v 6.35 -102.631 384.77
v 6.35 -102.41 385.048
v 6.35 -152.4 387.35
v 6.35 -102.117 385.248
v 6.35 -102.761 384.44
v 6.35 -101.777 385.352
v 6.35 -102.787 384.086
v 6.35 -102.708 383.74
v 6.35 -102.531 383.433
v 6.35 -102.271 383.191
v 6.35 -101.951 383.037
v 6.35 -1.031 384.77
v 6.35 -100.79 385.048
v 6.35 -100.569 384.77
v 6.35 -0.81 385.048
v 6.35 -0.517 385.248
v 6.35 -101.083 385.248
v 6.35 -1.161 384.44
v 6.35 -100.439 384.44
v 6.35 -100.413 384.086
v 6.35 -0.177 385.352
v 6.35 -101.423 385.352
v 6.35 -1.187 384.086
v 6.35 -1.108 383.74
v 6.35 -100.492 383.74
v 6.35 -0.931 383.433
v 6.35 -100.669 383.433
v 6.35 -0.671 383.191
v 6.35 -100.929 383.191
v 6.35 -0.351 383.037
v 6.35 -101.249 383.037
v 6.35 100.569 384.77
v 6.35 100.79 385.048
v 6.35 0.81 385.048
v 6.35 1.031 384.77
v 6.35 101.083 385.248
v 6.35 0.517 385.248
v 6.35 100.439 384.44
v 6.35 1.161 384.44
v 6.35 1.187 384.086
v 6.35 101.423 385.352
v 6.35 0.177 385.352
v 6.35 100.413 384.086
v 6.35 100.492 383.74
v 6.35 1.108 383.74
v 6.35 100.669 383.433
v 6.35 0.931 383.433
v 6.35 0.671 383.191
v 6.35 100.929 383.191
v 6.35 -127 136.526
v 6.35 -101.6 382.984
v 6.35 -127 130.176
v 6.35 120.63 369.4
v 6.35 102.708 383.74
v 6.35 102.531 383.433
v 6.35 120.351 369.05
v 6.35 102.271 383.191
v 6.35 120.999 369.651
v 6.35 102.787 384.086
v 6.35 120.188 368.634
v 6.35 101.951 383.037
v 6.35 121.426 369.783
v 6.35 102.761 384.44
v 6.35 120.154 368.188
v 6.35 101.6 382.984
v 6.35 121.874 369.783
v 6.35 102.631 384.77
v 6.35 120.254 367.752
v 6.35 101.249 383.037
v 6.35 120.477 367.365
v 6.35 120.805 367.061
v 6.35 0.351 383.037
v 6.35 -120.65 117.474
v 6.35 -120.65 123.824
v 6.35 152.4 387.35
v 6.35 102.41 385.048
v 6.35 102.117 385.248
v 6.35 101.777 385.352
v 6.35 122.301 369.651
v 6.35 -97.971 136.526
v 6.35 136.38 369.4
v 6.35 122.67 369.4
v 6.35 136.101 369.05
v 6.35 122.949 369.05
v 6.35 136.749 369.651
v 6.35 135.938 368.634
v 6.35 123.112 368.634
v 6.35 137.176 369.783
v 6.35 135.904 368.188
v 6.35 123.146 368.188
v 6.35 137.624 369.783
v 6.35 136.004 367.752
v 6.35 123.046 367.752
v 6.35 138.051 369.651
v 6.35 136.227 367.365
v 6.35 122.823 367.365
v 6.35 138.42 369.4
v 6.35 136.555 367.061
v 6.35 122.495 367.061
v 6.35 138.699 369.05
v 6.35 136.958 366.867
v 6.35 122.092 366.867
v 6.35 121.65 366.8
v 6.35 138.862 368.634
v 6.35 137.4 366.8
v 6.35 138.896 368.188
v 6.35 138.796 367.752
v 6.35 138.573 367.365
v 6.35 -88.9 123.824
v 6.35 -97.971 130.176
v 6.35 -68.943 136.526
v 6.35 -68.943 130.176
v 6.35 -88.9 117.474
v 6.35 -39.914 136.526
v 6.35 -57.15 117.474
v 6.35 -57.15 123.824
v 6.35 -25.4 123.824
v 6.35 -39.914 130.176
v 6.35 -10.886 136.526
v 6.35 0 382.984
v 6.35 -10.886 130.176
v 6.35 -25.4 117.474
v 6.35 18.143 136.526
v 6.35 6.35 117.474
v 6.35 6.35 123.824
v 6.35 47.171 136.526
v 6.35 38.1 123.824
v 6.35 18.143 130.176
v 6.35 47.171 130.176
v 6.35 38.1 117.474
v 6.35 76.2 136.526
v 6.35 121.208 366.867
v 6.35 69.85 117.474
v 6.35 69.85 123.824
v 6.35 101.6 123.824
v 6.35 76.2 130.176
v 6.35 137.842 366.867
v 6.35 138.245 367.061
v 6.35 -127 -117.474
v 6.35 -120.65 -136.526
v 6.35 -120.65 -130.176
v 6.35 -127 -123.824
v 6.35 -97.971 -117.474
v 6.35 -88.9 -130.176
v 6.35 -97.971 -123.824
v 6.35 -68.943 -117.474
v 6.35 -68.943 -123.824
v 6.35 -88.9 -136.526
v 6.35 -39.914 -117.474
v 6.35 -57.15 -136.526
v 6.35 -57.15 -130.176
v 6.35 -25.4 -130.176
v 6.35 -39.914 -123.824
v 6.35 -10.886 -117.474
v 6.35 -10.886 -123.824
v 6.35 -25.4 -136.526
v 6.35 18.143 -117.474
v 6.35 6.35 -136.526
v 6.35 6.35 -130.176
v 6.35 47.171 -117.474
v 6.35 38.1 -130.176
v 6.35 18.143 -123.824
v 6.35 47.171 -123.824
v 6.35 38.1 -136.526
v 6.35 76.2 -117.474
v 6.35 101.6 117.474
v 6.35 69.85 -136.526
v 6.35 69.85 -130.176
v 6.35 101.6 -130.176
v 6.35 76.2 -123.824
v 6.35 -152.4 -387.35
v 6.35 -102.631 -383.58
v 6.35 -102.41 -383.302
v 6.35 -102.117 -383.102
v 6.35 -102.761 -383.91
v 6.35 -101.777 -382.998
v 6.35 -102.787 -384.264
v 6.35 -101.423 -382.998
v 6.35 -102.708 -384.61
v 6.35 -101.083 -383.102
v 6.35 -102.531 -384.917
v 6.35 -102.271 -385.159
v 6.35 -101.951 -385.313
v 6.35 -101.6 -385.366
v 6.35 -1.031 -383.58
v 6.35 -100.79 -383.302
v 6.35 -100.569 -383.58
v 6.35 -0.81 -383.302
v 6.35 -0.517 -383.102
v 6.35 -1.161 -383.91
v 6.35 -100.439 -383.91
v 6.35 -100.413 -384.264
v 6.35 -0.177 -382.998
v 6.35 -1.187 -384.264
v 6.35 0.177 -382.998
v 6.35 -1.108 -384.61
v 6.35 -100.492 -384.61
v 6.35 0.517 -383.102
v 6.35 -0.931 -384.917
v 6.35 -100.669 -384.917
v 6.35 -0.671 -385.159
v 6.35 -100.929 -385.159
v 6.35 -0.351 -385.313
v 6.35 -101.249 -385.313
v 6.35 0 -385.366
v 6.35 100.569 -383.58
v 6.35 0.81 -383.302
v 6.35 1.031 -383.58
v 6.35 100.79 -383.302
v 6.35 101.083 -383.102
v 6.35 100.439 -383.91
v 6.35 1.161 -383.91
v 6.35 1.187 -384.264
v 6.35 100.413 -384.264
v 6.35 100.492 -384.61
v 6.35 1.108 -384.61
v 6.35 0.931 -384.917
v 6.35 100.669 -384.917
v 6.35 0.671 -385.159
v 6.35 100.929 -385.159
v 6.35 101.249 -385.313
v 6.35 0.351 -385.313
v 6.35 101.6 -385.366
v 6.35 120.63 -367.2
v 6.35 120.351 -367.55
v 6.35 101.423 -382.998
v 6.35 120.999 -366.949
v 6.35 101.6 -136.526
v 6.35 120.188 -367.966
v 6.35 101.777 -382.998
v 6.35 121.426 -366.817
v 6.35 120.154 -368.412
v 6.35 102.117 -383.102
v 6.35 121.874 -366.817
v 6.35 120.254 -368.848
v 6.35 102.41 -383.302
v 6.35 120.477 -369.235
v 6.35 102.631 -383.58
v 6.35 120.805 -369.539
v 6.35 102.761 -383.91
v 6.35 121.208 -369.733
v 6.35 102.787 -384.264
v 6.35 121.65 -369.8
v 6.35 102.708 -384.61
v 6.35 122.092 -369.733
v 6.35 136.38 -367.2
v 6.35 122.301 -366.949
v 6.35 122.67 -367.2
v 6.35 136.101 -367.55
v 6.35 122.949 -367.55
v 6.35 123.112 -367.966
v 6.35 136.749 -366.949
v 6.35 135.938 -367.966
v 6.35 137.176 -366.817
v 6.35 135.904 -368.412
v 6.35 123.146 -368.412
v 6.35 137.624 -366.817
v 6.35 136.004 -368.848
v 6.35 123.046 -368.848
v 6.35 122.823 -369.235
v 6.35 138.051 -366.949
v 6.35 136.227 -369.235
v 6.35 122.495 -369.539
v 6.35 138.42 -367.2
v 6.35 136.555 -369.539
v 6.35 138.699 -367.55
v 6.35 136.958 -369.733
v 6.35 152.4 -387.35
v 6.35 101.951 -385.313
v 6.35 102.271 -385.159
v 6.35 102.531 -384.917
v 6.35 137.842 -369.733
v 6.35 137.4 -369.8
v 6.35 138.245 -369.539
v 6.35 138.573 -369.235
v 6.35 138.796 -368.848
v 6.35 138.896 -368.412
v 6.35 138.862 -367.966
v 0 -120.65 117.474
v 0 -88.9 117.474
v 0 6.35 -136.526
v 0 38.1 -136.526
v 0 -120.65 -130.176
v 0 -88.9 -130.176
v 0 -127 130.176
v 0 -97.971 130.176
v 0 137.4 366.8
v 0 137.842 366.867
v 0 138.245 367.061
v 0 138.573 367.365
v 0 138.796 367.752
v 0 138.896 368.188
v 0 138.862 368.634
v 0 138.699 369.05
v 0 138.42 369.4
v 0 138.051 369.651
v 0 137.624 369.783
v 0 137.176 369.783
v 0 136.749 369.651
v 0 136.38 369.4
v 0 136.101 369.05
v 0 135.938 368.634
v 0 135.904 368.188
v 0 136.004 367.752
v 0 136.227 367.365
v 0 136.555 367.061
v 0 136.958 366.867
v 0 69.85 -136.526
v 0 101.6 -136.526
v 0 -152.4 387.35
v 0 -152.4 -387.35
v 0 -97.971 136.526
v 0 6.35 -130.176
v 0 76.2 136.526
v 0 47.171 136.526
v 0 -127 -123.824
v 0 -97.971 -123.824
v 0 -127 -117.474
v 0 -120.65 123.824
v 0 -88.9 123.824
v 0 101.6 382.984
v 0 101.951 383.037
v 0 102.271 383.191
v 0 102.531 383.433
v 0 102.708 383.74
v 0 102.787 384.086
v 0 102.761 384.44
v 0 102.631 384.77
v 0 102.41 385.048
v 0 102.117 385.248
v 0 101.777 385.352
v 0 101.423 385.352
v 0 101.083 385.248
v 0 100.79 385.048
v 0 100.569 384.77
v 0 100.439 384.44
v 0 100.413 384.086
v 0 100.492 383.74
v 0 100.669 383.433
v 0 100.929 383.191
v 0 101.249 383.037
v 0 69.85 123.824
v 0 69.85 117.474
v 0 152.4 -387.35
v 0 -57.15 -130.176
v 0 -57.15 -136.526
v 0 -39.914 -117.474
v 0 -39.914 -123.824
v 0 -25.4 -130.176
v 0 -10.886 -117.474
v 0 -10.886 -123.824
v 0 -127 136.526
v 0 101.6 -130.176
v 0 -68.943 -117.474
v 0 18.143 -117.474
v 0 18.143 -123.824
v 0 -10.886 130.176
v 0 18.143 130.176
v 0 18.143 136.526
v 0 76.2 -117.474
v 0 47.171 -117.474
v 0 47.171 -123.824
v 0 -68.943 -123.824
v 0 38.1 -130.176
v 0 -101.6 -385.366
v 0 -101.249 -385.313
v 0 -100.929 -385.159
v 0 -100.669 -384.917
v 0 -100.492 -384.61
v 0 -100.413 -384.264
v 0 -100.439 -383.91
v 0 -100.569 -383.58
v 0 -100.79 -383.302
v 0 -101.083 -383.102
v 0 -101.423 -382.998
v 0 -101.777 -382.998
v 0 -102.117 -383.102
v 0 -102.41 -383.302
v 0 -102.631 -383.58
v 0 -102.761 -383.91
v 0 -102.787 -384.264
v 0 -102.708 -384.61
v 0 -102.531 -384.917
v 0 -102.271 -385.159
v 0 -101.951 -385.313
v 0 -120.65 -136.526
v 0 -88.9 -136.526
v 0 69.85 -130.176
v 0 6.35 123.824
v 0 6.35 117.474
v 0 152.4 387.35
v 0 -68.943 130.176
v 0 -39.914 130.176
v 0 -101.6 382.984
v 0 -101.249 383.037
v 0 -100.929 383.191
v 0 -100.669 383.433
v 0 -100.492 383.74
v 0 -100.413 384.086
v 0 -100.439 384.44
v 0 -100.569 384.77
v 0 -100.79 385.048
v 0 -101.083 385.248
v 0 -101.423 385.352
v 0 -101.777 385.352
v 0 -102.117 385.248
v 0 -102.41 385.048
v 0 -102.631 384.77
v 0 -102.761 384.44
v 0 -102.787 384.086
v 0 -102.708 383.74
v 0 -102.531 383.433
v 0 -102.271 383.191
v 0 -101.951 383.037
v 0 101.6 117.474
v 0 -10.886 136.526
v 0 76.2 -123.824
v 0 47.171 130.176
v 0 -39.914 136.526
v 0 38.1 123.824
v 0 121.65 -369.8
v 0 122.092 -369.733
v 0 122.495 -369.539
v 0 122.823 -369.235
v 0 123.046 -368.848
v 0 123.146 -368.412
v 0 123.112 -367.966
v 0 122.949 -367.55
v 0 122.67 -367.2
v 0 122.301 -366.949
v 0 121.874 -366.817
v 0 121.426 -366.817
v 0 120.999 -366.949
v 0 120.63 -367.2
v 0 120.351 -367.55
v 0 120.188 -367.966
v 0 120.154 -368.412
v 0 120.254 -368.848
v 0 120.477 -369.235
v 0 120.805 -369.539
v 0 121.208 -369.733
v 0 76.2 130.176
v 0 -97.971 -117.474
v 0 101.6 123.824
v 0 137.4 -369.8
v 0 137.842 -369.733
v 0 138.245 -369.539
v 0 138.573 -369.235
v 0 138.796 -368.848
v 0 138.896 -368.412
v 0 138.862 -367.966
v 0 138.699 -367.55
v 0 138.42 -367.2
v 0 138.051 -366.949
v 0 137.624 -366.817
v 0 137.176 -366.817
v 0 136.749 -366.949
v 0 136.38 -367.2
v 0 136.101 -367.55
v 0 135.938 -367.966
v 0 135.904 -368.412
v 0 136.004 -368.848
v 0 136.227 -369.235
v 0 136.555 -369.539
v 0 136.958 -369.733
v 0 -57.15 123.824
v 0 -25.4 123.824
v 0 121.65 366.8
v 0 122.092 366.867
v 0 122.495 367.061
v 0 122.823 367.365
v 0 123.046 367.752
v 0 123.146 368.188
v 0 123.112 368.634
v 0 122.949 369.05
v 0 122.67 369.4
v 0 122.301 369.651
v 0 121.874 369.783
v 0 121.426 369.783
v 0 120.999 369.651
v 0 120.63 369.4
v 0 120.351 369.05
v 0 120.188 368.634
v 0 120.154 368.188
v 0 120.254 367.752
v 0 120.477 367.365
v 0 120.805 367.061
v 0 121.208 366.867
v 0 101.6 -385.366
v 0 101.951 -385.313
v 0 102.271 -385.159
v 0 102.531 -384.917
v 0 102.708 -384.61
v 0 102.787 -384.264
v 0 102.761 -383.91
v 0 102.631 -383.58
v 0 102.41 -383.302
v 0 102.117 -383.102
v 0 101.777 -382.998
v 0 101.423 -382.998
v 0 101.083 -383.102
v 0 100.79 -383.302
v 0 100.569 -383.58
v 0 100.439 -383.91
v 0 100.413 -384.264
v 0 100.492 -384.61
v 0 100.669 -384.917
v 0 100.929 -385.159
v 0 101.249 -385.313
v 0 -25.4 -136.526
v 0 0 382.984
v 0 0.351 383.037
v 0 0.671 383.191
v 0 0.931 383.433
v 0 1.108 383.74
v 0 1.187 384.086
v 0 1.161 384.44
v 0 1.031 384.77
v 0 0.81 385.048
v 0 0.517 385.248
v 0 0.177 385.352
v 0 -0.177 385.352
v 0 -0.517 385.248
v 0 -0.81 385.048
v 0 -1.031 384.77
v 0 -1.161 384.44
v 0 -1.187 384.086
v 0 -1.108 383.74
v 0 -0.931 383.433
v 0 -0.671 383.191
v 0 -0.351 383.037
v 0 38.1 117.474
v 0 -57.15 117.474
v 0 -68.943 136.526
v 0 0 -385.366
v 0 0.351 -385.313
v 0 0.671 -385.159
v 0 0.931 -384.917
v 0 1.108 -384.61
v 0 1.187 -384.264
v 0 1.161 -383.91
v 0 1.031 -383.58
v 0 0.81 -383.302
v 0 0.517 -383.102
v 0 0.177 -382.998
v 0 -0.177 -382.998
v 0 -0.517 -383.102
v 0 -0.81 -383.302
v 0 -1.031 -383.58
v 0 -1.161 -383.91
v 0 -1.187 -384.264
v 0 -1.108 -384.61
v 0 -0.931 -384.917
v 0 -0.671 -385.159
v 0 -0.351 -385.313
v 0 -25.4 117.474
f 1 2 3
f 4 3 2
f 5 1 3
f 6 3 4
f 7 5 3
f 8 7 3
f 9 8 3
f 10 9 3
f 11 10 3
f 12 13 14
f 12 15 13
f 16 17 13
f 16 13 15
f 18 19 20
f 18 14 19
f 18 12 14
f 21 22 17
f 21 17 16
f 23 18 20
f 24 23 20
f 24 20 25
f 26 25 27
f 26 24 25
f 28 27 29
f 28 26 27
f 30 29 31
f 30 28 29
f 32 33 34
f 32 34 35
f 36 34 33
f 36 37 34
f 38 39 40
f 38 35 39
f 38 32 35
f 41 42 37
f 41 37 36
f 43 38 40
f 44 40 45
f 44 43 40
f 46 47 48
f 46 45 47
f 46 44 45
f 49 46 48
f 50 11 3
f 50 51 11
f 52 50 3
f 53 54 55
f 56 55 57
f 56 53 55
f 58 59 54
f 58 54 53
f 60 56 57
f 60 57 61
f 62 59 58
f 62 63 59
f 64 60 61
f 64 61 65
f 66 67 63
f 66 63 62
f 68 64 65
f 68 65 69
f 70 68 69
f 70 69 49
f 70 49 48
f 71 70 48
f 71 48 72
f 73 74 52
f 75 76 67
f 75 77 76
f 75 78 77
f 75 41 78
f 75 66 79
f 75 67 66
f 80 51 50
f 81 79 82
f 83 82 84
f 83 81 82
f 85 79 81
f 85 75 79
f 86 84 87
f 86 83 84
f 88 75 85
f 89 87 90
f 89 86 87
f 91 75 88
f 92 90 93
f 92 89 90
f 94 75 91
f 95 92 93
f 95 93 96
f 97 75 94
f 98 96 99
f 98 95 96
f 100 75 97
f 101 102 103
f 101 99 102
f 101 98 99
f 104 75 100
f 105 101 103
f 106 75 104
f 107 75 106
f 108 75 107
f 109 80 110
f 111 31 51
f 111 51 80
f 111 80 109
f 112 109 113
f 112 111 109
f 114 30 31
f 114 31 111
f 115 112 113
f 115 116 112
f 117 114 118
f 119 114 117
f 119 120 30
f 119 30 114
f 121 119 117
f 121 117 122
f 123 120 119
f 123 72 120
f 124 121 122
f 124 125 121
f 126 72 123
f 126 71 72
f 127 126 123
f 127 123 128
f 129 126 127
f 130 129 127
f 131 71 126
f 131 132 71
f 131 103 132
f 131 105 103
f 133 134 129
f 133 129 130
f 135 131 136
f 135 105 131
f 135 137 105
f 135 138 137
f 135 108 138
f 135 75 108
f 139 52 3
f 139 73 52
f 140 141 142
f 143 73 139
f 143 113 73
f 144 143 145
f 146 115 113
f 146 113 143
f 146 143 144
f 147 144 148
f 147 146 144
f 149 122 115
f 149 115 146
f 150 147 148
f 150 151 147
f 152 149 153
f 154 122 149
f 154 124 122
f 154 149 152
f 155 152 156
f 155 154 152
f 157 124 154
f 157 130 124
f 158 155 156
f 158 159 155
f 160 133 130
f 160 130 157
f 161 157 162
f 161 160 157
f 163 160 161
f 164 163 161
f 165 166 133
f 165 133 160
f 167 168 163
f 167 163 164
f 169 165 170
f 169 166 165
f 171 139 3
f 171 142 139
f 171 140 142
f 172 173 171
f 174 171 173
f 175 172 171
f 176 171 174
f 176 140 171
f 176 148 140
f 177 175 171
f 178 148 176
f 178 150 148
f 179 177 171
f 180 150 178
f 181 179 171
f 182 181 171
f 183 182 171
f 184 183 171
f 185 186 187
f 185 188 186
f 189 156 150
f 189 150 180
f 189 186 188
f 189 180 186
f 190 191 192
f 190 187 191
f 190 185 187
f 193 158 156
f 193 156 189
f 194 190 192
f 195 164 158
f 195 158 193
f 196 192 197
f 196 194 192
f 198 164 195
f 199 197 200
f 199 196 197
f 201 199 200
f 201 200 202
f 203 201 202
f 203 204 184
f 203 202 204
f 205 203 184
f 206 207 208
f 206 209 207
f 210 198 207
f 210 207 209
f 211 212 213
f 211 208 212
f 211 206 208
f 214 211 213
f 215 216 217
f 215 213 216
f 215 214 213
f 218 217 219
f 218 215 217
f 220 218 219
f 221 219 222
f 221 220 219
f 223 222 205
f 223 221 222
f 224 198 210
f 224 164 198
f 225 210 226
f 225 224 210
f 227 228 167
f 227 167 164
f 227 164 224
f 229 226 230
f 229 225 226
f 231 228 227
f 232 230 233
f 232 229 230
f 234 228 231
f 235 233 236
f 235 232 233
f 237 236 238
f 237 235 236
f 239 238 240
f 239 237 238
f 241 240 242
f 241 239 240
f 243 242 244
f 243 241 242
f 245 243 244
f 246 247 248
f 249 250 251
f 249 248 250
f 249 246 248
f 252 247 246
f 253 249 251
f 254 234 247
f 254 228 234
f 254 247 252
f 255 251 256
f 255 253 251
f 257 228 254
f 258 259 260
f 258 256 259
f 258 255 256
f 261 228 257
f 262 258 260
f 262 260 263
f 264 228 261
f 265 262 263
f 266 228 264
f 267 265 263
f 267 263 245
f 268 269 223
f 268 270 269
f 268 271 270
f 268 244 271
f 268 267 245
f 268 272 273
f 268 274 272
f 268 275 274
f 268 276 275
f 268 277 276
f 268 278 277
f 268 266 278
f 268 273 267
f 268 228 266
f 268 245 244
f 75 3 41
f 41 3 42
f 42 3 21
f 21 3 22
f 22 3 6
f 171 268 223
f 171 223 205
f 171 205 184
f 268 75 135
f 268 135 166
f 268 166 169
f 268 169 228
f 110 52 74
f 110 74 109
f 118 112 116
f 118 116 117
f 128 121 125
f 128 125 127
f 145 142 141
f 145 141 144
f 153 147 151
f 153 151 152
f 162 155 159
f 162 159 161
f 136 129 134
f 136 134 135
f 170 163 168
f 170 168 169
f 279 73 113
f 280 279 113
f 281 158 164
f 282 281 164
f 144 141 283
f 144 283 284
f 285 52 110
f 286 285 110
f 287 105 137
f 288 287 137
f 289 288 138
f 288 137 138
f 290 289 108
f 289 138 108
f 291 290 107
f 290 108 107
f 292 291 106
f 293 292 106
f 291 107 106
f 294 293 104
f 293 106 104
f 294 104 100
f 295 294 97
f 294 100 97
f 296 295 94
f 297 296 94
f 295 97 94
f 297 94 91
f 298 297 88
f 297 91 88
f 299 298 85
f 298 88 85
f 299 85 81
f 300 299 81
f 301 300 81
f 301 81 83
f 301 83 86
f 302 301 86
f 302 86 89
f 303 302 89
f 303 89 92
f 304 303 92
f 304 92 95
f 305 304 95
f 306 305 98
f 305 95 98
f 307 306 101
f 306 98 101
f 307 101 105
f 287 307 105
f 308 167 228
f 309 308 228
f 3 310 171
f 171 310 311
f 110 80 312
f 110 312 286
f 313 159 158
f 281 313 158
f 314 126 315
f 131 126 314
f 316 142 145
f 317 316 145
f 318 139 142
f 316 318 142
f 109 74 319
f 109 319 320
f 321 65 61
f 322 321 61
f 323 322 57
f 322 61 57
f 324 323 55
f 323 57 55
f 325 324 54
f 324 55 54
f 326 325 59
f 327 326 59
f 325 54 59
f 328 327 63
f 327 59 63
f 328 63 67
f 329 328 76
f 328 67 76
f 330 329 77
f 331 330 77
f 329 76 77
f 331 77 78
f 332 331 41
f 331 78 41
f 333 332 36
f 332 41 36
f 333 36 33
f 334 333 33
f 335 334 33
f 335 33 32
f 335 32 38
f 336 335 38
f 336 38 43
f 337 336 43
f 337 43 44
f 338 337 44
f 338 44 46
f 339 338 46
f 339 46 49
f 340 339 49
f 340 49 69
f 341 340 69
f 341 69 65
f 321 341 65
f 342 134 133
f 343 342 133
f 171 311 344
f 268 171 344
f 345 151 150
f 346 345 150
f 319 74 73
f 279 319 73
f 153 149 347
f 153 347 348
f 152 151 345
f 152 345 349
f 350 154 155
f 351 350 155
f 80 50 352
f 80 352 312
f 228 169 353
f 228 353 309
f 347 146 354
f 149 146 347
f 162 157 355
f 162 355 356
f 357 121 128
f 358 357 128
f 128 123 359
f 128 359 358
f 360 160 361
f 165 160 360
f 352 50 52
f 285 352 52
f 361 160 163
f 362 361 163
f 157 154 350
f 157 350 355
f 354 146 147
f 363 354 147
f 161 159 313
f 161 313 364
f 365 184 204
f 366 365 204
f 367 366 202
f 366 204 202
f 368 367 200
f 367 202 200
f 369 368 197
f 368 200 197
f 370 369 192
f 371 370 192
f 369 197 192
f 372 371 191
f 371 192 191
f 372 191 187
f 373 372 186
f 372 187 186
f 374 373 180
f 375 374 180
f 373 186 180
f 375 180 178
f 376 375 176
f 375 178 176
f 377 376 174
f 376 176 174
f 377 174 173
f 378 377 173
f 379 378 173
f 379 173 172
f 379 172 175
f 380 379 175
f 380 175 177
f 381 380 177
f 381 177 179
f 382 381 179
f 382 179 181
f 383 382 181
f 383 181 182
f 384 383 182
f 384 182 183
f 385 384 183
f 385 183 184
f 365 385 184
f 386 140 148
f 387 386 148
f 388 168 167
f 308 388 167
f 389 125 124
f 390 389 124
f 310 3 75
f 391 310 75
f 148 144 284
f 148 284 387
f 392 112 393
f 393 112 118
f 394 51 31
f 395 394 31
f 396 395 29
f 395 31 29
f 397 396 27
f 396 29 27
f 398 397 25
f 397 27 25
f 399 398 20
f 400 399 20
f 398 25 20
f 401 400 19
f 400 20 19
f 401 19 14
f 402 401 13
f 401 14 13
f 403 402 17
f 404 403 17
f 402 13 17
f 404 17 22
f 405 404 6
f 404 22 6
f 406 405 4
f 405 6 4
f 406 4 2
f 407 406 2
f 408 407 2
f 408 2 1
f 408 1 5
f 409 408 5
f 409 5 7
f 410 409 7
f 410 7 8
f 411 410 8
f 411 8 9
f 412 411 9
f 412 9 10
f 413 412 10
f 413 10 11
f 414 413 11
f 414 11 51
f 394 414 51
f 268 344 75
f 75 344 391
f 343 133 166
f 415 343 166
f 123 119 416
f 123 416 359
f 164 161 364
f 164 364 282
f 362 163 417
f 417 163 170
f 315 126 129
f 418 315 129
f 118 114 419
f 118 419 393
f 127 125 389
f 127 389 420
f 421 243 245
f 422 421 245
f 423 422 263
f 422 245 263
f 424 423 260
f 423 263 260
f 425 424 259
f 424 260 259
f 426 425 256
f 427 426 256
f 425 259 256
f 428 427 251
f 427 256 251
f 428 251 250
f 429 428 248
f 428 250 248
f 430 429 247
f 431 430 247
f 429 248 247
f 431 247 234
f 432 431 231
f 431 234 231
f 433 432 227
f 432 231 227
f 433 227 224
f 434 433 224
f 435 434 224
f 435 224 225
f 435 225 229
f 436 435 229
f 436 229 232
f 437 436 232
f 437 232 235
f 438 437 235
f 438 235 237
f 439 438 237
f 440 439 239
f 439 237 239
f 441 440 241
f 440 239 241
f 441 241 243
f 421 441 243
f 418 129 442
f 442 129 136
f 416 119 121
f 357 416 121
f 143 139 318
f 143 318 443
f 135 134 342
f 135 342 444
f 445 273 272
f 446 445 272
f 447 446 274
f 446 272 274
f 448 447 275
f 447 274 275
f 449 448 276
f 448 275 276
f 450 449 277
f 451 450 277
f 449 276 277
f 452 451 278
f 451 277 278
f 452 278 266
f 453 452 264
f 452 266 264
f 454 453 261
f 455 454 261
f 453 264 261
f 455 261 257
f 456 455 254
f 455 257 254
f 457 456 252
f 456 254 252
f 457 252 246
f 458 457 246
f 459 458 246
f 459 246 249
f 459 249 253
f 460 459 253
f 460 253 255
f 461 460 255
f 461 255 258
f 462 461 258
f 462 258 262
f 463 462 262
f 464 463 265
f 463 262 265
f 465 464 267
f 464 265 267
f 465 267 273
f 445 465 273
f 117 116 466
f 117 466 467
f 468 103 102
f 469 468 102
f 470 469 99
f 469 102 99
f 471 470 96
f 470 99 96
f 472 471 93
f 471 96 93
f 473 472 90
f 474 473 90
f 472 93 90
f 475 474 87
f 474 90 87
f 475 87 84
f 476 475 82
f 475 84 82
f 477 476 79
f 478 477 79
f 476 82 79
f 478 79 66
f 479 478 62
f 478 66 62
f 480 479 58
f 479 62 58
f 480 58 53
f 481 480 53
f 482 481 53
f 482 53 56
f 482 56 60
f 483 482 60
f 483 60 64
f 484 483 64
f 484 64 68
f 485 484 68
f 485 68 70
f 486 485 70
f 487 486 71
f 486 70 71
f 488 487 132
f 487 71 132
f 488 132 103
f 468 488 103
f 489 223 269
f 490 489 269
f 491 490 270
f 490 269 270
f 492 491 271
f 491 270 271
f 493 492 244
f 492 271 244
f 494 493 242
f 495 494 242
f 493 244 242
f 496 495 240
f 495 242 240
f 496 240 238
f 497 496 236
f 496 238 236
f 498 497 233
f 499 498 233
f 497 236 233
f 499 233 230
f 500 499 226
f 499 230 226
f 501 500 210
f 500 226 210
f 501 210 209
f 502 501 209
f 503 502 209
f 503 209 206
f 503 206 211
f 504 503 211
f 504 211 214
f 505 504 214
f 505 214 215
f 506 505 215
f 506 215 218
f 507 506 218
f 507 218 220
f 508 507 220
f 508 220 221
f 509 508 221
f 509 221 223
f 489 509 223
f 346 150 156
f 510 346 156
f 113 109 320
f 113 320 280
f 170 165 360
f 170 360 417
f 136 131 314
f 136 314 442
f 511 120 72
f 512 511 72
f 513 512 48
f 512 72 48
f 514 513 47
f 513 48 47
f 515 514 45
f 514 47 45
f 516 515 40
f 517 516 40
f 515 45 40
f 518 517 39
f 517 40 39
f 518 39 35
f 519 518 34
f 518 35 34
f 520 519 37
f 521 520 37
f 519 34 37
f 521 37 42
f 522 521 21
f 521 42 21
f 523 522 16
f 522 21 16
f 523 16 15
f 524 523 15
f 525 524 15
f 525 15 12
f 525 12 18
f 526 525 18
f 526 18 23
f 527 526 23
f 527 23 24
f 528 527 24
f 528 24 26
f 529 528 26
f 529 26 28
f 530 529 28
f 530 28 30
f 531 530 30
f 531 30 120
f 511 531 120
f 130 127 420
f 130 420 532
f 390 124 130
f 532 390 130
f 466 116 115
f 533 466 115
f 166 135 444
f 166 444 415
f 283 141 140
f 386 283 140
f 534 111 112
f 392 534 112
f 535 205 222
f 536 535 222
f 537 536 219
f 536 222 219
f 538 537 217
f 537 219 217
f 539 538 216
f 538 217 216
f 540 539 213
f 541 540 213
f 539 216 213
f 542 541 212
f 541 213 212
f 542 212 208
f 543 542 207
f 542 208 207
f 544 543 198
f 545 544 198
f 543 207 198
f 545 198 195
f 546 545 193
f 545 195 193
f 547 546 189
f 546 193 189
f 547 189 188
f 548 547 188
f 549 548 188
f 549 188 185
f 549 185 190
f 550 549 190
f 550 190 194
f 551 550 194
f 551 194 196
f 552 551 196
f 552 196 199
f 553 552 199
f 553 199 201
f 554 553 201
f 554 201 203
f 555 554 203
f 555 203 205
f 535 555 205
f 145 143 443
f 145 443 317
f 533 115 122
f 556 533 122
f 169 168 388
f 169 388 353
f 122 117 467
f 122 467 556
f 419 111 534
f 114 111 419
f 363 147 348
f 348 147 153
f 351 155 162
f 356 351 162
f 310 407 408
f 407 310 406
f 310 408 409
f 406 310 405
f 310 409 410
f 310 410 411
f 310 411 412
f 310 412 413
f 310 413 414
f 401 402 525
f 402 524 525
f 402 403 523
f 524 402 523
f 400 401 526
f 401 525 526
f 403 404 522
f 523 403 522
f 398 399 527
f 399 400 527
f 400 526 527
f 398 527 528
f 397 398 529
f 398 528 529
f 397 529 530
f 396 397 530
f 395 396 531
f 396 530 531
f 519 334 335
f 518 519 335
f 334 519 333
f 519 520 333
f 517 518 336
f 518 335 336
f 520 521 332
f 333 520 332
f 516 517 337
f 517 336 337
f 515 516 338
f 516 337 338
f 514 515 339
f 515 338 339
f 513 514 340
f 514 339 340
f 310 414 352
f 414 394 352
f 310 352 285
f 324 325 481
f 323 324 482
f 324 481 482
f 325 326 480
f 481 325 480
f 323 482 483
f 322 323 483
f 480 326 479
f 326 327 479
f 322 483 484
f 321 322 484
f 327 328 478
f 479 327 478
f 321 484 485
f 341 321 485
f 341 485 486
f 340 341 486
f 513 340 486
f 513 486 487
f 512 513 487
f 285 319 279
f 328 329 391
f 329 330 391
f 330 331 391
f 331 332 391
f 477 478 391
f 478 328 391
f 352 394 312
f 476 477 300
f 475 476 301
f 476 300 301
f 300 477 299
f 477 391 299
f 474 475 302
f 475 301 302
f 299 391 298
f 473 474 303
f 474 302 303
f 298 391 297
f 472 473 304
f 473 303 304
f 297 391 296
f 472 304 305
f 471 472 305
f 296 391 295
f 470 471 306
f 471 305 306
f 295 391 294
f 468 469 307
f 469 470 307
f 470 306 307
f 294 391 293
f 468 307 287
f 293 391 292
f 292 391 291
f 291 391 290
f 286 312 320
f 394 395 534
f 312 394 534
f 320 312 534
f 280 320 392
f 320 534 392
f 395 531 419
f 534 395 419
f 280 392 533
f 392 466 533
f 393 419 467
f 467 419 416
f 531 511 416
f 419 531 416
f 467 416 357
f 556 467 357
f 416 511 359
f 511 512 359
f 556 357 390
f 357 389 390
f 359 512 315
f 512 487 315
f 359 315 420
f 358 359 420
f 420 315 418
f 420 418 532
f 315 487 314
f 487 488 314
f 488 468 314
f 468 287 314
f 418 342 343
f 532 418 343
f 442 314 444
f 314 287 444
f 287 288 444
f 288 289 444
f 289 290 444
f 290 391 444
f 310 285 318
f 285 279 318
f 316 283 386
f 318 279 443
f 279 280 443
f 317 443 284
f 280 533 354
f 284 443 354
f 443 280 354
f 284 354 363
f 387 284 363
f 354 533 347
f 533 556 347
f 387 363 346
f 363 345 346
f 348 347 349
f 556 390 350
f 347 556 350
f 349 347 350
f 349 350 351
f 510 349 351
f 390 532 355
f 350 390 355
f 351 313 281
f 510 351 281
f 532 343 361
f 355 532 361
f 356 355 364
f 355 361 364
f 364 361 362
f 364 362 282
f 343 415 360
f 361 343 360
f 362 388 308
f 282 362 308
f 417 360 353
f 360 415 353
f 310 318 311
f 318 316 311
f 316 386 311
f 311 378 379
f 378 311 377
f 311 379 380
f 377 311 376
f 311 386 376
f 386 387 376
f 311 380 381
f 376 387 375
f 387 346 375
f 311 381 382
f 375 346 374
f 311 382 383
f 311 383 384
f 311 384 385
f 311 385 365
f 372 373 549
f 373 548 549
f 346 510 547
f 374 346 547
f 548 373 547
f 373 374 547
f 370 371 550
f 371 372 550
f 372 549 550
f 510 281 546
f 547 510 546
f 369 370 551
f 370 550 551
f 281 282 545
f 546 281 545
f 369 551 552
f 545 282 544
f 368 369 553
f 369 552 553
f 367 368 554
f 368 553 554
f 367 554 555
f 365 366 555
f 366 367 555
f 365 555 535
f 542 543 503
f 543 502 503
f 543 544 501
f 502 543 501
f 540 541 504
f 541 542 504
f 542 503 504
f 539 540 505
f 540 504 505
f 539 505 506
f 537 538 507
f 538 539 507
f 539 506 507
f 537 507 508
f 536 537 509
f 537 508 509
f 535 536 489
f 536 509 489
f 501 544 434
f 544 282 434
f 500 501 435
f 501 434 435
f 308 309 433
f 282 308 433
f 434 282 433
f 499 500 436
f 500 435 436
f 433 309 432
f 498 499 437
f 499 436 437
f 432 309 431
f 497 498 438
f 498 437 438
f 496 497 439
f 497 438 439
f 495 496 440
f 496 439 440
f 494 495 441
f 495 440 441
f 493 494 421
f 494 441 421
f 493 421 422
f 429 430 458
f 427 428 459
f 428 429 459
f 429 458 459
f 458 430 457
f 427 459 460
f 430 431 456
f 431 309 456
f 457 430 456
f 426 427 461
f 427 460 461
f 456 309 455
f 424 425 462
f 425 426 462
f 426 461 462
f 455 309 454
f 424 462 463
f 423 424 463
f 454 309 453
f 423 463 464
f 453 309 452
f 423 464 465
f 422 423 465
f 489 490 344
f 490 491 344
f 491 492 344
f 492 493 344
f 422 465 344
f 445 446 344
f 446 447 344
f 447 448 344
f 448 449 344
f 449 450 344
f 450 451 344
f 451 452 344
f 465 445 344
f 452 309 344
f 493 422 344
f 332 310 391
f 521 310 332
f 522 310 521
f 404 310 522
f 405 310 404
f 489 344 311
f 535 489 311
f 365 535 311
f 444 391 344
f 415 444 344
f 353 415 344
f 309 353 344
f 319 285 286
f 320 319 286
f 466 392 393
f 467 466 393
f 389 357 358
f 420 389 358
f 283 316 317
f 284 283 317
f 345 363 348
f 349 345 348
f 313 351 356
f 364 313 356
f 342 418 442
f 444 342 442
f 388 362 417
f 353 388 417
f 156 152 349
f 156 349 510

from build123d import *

# Parameters (mm, degrees)
BOSS_EXTRUDE1_DEPTH            = 6.35
SKETCH3_W                      = 6.35
SKETCH3_H                      = 31.75
SKETCH3_H_2                    = 29.028571429
CUT_EXTRUDE1_DEPTH             = 419.66682159
SKETCH4_R                      = 1.5
CUT_EXTRUDE2_DEPTH             = 6.35
SKETCH5_W                      = 6.35
SKETCH5_H                      = 44.45
SKETCH5_W_2                    = 59.592307692
SKETCH5_H_2                    = 6.35
CUT_EXTRUDE3_DEPTH             = 6.35
SKETCH6_W                      = 6.35
SKETCH6_H                      = 222.25
BOSS_EXTRUDE2_DEPTH            = 6.35
SKETCH7_W                      = 774.7
SKETCH7_H                      = 14.696452311
CUT_EXTRUDE4_DEPTH             = 6.35
SKETCH8_R                      = 1.190625
HOLES_FOR_PLASTIC_SCREWS_DEPTH = 10


with BuildPart() as part:
    # Sketch1 → Boss-Extrude1 (new body)
    with BuildSketch(Plane(origin=(0, 0, 0), x_dir=(0, 0, -1), z_dir=(1, 0, 0))):
        Polygon((-387.35, 152.4), (-387.35, 107.95), (-381, 107.95), (-381, 63.5), (-387.35, 63.5), (-387.35, 19.05), (-381, 19.05), (-381, -25.4), (-387.35, -25.4), (-387.35, -69.85), (-381, -69.85), (-381, -114.3), (-387.35, -114.3), (-387.35, -152.4), (-327.757692308, -152.4), (-327.757692308, -158.75), (-268.165384615, -158.75), (-268.165384615, -152.4), (-208.573076923, -152.4), (-208.573076923, -158.75), (-148.980769231, -158.75), (-148.980769231, -152.4), (-89.388461538, -152.4), (-89.388461538, -158.75), (-29.796153846, -158.75), (-29.796153846, -152.4), (29.796153846, -152.4), (29.796153846, -158.75), (89.388461538, -158.75), (89.388461538, -152.4), (148.980769231, -152.4), (148.980769231, -158.75), (208.573076923, -158.75), (208.573076923, -152.4), (268.165384615, -152.4), (268.165384615, -158.75), (327.757692308, -158.75), (327.757692308, -152.4), (387.35, -152.4), (387.35, -114.3), (381, -114.3), (381, -69.85), (387.35, -69.85), (387.35, -25.4), (381, -25.4), (381, 19.05), (387.35, 19.05), (387.35, 63.5), (381, 63.5), (381, 107.95), (387.35, 107.95), (387.35, 152.4), align=None)
    extrude(amount=BOSS_EXTRUDE1_DEPTH)

    # Sketch3 → Cut-Extrude1 (cut, through all)
    with BuildSketch(Plane(origin=(6.35, 0, 0), x_dir=(0, 0, -1), z_dir=(1, 0, 0))):
        with Locations((-120.648769685, -104.775)):
            Rectangle(SKETCH3_W, SKETCH3_H)
        with Locations((-120.648769685, -41.275)):
            Rectangle(SKETCH3_W, SKETCH3_H)
        with Locations((-120.648769685, 22.225)):
            Rectangle(SKETCH3_W, SKETCH3_H)
        with Locations((-120.648769685, 85.725)):
            Rectangle(SKETCH3_W, SKETCH3_H)
        with Locations((-133.351230315, 61.685714285)):
            Rectangle(SKETCH3_W, SKETCH3_H_2)
        with Locations((-133.351230315, 3.628571428)):
            Rectangle(SKETCH3_W, SKETCH3_H_2)
        with Locations((-133.351230315, -54.428571428)):
            Rectangle(SKETCH3_W, SKETCH3_H_2)
        with Locations((-133.351230315, -112.485714286)):
            Rectangle(SKETCH3_W, SKETCH3_H_2)
        with Locations((133.351230315, 85.725)):
            Rectangle(SKETCH3_W, SKETCH3_H)
        with Locations((120.648769685, 61.685714285)):
            Rectangle(SKETCH3_W, SKETCH3_H_2)
        with Locations((133.351230315, 22.225)):
            Rectangle(SKETCH3_W, SKETCH3_H)
        with Locations((120.648769685, 3.628571428)):
            Rectangle(SKETCH3_W, SKETCH3_H_2)
        with Locations((133.351230315, -41.275)):
            Rectangle(SKETCH3_W, SKETCH3_H)
        with Locations((120.648769685, -54.428571428)):
            Rectangle(SKETCH3_W, SKETCH3_H_2)
        with Locations((133.351230315, -104.775)):
            Rectangle(SKETCH3_W, SKETCH3_H)
        with Locations((120.648769685, -112.485714286)):
            Rectangle(SKETCH3_W, SKETCH3_H_2)
    extrude(amount=-CUT_EXTRUDE1_DEPTH, mode=Mode.SUBTRACT)

    # Sketch4 → Cut-Extrude2 (cut)
    with BuildSketch(Plane(origin=(6.35, 0, 0), x_dir=(0, 0, -1), z_dir=(1, 0, 0))):
        with Locations((-368.3, 137.4)):
            Circle(SKETCH4_R)
        with Locations((-368.3, 121.65)):
            Circle(SKETCH4_R)
        with Locations((368.3, 137.4)):
            Circle(SKETCH4_R)
        with Locations((368.3, 121.65)):
            Circle(SKETCH4_R)
    extrude(amount=-CUT_EXTRUDE2_DEPTH, mode=Mode.SUBTRACT)

    # Sketch5 → Cut-Extrude3 (cut)
    with BuildSketch(Plane(origin=(6.35, 0, 0), x_dir=(0, 0, -1), z_dir=(1, 0, 0))):
        with Locations((-384.175, 41.275)):
            Rectangle(SKETCH5_W, SKETCH5_H)
        with Locations((-384.175, -47.625)):
            Rectangle(SKETCH5_W, SKETCH5_H)
        with Locations((-178.776923077, -155.575)):
            Rectangle(SKETCH5_W_2, SKETCH5_H_2)
        with Locations((-59.592307692, -155.575)):
            Rectangle(SKETCH5_W_2, SKETCH5_H_2)
        with Locations((59.592307692, -155.575)):
            Rectangle(SKETCH5_W_2, SKETCH5_H_2)
        with Locations((178.776923077, -155.575)):
            Rectangle(SKETCH5_W_2, SKETCH5_H_2)
        with Locations((384.175, -47.625)):
            Rectangle(SKETCH5_W, SKETCH5_H)
        with Locations((384.175, 41.275)):
            Rectangle(SKETCH5_W, SKETCH5_H)
    extrude(amount=-CUT_EXTRUDE3_DEPTH, mode=Mode.SUBTRACT)

    # Sketch6 → Boss-Extrude2 (add)
    with BuildSketch(Plane(origin=(6.35, 0, 0), x_dir=(0, 0, -1), z_dir=(1, 0, 0))):
        with Locations((-384.175, -3.175)):
            Rectangle(SKETCH6_W, SKETCH6_H)
        with Locations((384.175, -3.175)):
            Rectangle(SKETCH6_W, SKETCH6_H)
    extrude(amount=-BOSS_EXTRUDE2_DEPTH)

    # Sketch7 → Cut-Extrude4 (cut)
    with BuildSketch(Plane(origin=(6.35, 0, 0), x_dir=(0, 0, -1), z_dir=(1, 0, 0))):
        with Locations((0, -159.748226155)):
            Rectangle(SKETCH7_W, SKETCH7_H)
    extrude(amount=-CUT_EXTRUDE4_DEPTH, mode=Mode.SUBTRACT)

    # Sketch8 → Holes for plastic screws (cut)
    with BuildSketch(Plane(origin=(6.35, 0, 0), x_dir=(0, 0, -1), z_dir=(1, 0, 0))):
        with Locations((384.175, 101.6)):
            Circle(SKETCH8_R)
        with Locations((384.175, 0)):
            Circle(SKETCH8_R)
        with Locations((384.175, -101.6)):
            Circle(SKETCH8_R)
        with Locations((-384.175, -101.6)):
            Circle(SKETCH8_R)
        with Locations((-384.175, 0)):
            Circle(SKETCH8_R)
        with Locations((-384.175, 101.6)):
            Circle(SKETCH8_R)
    extrude(amount=-HOLES_FOR_PLASTIC_SCREWS_DEPTH, mode=Mode.SUBTRACT)


solid = part.part
